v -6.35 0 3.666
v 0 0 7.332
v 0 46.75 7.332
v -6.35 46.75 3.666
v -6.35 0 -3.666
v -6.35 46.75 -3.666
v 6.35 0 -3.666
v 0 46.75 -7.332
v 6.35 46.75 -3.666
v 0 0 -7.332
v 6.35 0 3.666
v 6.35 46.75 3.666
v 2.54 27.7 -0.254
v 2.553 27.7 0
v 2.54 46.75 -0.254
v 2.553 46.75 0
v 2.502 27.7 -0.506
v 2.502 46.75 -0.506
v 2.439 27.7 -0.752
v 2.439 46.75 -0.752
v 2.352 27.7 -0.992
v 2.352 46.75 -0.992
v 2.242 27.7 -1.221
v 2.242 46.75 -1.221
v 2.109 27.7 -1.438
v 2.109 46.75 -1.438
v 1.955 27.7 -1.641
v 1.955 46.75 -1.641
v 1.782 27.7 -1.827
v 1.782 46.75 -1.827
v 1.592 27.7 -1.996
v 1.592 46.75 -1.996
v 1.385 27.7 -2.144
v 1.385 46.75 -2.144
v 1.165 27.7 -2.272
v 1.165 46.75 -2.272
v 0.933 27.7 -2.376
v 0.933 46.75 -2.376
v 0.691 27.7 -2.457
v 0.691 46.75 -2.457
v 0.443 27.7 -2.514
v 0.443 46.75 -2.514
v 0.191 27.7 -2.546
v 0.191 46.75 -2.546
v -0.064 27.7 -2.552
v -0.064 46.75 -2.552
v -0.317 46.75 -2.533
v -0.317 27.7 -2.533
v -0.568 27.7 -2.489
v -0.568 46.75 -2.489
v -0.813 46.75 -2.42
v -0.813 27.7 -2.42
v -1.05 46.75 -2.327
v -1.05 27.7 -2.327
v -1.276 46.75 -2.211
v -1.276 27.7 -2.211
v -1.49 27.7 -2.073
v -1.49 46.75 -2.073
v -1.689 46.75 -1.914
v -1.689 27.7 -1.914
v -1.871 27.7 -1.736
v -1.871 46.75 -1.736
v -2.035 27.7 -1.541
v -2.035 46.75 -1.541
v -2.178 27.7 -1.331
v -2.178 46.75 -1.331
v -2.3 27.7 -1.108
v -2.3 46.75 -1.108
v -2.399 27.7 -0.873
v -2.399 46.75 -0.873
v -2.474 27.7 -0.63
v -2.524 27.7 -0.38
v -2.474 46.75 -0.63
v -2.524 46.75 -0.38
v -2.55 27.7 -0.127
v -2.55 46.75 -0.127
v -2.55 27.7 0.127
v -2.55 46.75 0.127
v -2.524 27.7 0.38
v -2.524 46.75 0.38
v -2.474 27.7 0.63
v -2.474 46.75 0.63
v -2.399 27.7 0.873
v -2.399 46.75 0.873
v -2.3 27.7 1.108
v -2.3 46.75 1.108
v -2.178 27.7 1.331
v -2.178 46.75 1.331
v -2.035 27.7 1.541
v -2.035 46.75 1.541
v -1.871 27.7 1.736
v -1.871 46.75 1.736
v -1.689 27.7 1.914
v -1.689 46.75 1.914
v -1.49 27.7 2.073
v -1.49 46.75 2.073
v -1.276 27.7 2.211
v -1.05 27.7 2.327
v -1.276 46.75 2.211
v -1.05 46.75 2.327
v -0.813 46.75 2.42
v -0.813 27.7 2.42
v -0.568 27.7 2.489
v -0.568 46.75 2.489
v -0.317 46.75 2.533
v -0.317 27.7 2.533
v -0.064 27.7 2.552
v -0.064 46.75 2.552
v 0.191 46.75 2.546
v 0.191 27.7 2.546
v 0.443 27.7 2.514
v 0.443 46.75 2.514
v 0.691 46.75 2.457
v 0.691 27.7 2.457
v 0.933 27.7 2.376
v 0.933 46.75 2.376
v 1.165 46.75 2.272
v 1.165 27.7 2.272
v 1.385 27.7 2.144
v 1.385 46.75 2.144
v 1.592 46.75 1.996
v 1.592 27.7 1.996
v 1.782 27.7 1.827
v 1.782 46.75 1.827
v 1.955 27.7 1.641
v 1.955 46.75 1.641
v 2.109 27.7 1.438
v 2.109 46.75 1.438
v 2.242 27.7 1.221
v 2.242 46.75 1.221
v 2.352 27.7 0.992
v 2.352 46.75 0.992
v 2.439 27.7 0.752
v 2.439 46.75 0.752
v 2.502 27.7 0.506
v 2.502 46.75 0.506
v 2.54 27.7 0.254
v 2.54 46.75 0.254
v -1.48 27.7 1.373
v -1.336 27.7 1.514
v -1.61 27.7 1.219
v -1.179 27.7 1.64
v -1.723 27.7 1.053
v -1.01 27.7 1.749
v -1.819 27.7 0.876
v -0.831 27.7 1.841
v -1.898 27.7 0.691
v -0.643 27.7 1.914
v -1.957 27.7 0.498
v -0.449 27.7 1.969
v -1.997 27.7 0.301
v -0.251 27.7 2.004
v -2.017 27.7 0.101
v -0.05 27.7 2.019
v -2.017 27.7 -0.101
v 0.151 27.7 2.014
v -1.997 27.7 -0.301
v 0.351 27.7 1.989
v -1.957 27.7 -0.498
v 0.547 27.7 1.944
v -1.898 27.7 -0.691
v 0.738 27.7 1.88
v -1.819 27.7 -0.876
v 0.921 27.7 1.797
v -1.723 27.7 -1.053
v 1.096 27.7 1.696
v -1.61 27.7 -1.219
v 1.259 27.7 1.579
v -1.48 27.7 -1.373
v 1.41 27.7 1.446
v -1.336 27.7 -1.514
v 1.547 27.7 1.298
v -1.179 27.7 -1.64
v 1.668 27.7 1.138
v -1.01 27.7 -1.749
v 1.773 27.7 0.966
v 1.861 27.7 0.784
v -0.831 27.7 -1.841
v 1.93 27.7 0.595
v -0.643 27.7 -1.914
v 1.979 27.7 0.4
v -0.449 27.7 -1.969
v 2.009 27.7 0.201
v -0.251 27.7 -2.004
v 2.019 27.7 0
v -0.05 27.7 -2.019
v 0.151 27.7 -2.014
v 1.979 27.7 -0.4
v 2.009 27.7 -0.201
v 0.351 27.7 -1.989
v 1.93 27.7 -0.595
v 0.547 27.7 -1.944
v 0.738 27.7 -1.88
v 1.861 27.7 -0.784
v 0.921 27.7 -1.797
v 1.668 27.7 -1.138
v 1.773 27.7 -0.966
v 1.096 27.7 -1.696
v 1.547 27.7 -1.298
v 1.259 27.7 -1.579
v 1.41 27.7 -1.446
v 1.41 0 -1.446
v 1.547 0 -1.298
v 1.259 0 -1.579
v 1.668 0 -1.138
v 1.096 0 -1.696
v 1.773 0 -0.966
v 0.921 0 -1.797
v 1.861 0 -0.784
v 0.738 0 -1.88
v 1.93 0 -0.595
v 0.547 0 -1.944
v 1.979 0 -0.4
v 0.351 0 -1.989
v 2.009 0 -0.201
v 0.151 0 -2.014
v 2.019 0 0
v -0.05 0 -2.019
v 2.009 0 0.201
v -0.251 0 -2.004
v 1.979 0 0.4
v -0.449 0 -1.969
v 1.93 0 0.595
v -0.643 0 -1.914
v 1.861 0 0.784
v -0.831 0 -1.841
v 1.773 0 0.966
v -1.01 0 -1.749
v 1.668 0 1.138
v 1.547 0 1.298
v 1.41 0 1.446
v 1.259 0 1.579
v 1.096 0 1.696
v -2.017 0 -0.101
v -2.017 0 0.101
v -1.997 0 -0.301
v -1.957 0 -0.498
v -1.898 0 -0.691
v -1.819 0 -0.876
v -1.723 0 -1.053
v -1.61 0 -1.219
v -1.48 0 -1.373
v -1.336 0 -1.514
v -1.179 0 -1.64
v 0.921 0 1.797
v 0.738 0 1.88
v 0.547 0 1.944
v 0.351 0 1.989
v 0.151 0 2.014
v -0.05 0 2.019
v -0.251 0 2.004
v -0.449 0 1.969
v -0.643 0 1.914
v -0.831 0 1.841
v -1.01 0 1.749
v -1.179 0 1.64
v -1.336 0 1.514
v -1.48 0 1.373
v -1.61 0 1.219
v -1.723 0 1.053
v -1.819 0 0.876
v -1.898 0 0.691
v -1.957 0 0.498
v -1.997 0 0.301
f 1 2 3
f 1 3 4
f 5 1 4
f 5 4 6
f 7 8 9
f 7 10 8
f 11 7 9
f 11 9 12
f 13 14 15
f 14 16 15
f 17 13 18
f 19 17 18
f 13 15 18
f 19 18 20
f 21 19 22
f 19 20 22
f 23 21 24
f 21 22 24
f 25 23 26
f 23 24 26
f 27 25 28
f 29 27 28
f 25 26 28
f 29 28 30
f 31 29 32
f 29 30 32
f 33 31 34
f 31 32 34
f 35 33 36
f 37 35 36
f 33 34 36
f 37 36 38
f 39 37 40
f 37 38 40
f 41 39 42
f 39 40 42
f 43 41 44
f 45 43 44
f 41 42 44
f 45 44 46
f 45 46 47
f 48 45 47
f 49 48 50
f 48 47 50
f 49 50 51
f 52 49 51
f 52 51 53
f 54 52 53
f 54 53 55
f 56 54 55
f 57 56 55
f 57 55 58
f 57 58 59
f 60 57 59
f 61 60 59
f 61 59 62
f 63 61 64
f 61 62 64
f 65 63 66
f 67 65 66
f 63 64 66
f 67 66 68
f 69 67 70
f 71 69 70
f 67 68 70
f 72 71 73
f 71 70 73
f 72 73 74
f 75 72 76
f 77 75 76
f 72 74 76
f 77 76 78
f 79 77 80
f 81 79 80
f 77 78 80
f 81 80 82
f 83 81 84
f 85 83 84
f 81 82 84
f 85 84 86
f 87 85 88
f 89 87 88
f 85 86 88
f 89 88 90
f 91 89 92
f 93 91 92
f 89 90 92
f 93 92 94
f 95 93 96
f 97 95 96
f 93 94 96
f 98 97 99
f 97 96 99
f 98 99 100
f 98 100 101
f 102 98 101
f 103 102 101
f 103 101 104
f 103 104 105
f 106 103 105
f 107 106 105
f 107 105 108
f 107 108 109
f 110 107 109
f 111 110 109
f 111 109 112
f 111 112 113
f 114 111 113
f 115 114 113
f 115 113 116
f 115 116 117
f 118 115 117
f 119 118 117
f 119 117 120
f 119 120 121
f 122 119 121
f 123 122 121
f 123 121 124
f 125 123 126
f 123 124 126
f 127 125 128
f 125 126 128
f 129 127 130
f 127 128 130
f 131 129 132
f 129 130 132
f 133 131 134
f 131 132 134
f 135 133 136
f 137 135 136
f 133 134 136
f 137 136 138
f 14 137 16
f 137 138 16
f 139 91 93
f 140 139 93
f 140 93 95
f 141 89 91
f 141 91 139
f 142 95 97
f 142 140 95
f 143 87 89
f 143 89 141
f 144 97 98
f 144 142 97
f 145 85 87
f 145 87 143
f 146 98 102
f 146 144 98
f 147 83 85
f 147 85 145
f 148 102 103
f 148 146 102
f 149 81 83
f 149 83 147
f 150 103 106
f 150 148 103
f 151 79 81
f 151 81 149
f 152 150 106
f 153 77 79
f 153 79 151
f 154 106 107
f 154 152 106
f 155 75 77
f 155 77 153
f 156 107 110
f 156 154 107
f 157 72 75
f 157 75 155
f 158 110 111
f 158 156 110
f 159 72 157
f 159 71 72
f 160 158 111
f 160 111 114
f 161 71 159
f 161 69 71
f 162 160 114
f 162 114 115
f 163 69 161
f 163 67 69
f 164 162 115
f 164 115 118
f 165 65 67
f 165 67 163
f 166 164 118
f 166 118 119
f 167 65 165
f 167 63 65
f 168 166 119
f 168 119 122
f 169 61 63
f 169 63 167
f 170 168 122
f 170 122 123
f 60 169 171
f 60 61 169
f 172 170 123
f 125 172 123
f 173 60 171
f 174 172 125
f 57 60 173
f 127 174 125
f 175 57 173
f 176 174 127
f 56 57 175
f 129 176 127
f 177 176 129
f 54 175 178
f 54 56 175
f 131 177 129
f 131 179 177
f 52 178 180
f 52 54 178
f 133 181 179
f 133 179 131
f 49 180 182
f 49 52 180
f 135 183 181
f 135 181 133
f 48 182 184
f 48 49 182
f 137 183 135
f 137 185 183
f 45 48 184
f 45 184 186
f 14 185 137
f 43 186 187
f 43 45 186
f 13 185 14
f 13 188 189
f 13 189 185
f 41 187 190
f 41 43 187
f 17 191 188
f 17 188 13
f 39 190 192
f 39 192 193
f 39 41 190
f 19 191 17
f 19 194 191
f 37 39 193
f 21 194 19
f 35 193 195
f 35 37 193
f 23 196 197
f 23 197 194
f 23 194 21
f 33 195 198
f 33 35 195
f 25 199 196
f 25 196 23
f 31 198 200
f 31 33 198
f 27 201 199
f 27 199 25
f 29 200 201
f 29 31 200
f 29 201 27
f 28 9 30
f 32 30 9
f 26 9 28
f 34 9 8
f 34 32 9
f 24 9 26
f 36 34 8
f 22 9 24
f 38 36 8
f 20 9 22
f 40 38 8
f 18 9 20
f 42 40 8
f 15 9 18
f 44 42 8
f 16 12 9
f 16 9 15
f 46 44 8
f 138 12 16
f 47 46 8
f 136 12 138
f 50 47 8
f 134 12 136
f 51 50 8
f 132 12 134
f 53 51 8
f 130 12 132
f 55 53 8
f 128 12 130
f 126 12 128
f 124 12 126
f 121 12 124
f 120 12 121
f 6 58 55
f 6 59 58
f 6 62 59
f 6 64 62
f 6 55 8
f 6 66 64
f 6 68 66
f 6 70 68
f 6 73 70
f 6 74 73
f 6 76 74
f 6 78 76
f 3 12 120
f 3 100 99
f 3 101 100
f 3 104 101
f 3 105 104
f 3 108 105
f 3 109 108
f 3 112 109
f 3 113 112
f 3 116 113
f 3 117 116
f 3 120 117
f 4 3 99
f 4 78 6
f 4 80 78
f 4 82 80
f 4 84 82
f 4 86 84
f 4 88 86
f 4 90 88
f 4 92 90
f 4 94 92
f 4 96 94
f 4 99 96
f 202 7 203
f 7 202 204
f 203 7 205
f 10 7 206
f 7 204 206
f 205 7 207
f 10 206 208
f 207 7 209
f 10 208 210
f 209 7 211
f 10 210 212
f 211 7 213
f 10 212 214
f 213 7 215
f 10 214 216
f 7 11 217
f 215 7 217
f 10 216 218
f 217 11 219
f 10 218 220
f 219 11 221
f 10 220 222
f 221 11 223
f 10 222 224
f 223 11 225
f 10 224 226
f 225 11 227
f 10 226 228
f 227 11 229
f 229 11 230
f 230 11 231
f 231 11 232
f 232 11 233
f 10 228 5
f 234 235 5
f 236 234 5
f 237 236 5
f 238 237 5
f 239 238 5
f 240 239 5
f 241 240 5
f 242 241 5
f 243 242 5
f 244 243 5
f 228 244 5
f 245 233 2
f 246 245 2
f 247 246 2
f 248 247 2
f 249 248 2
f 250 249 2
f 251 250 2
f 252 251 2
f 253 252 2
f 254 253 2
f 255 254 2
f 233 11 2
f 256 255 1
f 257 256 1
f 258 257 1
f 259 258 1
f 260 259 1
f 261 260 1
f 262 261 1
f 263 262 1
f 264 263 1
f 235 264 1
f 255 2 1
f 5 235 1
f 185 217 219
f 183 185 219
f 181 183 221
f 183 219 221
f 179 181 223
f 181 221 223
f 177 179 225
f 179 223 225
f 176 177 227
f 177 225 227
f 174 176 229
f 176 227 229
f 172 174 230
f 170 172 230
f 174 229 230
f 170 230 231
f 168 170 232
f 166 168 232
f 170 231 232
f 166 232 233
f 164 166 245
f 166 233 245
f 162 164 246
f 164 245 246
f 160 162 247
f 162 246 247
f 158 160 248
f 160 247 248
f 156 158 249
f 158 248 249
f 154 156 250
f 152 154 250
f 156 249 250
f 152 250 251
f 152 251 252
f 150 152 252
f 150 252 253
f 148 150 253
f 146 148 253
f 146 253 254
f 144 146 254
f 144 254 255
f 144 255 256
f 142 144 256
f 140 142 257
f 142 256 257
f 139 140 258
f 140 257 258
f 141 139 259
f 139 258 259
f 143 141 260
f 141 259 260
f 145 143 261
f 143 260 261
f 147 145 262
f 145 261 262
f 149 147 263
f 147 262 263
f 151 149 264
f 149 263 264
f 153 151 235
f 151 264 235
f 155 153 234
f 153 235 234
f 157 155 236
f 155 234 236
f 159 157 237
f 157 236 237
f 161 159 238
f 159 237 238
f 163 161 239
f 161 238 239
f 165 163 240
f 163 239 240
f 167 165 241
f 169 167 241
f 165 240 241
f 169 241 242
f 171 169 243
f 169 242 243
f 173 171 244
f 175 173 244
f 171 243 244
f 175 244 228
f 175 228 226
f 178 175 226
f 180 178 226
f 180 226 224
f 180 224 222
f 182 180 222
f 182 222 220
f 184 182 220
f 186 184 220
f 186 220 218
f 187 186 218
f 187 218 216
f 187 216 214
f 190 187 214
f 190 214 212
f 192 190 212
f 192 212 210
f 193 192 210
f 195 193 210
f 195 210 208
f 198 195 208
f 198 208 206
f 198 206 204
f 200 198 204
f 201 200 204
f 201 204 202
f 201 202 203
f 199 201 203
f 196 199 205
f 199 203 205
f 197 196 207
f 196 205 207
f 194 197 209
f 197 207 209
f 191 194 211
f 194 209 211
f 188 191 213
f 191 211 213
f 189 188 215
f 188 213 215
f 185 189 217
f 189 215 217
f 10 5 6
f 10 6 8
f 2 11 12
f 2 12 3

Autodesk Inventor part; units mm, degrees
ref_plane "YZ Plane" through (0, 0, 0) normal (1, 0, 0) x (0, 1, 0)
ref_plane "XZ Plane" through (0, 0, 0) normal (0, 1, 0) x (-1, 0, 0)
ref_plane "XY Plane" through (0, 0, 0) normal (0, 0, 1) x (1, 0, 0)
sketch "Sketch1" plane through (0, 0, 0) normal (0, 1, 0) x (-1, 0, 0)
  line L0 (6.35, 3.6662) -> (6.35, -3.6662)
  line L1 (6.35, -3.6662) -> (0, -7.3323)
  line L2 (0, -7.3323) -> (-6.35, -3.6662)
  line L3 (-6.35, -3.6662) -> (-6.35, 3.6662)
  line L4 (-6.35, 3.6662) -> (0, 7.3323)
  line L5 (0, 7.3323) -> (6.35, 3.6662)
  point P0 (0, 0)
  point P1 (0, 0)
  dimension "d0" = 12.7
extrude "Extrusion1" add sketch "Sketch1" along normal blind 46.75
sketch "Sketch2" plane through (0, 46.75, 0) normal (0, 1, 0) x (1, 0, 0)
  circle A0 centre (0, 0) radius 2.5527
  dimension "d3" = 5.1054
extrude "Extrusion2" cut sketch "Sketch2" against normal blind 19.05
sketch "Sketch3" plane through (0, 0, 0) normal (0, -1, 0) x (1, 0, 0)
  circle A0 centre (0, 0) radius 2.0193
  dimension "d6" = 4.0386
extrude "Extrusion3" cut sketch "Sketch3" against normal through all
thread "Thread1" size "10-32 UNF" class "2B" standard "ANSI Unified Screw Threads" full length
thread "Thread2" size "1/4-20 UNC" class "2B" standard "ANSI Unified Screw Threads" full length
properties part number "CORL_013_SmallShaft" material "Aluminum 6061"
